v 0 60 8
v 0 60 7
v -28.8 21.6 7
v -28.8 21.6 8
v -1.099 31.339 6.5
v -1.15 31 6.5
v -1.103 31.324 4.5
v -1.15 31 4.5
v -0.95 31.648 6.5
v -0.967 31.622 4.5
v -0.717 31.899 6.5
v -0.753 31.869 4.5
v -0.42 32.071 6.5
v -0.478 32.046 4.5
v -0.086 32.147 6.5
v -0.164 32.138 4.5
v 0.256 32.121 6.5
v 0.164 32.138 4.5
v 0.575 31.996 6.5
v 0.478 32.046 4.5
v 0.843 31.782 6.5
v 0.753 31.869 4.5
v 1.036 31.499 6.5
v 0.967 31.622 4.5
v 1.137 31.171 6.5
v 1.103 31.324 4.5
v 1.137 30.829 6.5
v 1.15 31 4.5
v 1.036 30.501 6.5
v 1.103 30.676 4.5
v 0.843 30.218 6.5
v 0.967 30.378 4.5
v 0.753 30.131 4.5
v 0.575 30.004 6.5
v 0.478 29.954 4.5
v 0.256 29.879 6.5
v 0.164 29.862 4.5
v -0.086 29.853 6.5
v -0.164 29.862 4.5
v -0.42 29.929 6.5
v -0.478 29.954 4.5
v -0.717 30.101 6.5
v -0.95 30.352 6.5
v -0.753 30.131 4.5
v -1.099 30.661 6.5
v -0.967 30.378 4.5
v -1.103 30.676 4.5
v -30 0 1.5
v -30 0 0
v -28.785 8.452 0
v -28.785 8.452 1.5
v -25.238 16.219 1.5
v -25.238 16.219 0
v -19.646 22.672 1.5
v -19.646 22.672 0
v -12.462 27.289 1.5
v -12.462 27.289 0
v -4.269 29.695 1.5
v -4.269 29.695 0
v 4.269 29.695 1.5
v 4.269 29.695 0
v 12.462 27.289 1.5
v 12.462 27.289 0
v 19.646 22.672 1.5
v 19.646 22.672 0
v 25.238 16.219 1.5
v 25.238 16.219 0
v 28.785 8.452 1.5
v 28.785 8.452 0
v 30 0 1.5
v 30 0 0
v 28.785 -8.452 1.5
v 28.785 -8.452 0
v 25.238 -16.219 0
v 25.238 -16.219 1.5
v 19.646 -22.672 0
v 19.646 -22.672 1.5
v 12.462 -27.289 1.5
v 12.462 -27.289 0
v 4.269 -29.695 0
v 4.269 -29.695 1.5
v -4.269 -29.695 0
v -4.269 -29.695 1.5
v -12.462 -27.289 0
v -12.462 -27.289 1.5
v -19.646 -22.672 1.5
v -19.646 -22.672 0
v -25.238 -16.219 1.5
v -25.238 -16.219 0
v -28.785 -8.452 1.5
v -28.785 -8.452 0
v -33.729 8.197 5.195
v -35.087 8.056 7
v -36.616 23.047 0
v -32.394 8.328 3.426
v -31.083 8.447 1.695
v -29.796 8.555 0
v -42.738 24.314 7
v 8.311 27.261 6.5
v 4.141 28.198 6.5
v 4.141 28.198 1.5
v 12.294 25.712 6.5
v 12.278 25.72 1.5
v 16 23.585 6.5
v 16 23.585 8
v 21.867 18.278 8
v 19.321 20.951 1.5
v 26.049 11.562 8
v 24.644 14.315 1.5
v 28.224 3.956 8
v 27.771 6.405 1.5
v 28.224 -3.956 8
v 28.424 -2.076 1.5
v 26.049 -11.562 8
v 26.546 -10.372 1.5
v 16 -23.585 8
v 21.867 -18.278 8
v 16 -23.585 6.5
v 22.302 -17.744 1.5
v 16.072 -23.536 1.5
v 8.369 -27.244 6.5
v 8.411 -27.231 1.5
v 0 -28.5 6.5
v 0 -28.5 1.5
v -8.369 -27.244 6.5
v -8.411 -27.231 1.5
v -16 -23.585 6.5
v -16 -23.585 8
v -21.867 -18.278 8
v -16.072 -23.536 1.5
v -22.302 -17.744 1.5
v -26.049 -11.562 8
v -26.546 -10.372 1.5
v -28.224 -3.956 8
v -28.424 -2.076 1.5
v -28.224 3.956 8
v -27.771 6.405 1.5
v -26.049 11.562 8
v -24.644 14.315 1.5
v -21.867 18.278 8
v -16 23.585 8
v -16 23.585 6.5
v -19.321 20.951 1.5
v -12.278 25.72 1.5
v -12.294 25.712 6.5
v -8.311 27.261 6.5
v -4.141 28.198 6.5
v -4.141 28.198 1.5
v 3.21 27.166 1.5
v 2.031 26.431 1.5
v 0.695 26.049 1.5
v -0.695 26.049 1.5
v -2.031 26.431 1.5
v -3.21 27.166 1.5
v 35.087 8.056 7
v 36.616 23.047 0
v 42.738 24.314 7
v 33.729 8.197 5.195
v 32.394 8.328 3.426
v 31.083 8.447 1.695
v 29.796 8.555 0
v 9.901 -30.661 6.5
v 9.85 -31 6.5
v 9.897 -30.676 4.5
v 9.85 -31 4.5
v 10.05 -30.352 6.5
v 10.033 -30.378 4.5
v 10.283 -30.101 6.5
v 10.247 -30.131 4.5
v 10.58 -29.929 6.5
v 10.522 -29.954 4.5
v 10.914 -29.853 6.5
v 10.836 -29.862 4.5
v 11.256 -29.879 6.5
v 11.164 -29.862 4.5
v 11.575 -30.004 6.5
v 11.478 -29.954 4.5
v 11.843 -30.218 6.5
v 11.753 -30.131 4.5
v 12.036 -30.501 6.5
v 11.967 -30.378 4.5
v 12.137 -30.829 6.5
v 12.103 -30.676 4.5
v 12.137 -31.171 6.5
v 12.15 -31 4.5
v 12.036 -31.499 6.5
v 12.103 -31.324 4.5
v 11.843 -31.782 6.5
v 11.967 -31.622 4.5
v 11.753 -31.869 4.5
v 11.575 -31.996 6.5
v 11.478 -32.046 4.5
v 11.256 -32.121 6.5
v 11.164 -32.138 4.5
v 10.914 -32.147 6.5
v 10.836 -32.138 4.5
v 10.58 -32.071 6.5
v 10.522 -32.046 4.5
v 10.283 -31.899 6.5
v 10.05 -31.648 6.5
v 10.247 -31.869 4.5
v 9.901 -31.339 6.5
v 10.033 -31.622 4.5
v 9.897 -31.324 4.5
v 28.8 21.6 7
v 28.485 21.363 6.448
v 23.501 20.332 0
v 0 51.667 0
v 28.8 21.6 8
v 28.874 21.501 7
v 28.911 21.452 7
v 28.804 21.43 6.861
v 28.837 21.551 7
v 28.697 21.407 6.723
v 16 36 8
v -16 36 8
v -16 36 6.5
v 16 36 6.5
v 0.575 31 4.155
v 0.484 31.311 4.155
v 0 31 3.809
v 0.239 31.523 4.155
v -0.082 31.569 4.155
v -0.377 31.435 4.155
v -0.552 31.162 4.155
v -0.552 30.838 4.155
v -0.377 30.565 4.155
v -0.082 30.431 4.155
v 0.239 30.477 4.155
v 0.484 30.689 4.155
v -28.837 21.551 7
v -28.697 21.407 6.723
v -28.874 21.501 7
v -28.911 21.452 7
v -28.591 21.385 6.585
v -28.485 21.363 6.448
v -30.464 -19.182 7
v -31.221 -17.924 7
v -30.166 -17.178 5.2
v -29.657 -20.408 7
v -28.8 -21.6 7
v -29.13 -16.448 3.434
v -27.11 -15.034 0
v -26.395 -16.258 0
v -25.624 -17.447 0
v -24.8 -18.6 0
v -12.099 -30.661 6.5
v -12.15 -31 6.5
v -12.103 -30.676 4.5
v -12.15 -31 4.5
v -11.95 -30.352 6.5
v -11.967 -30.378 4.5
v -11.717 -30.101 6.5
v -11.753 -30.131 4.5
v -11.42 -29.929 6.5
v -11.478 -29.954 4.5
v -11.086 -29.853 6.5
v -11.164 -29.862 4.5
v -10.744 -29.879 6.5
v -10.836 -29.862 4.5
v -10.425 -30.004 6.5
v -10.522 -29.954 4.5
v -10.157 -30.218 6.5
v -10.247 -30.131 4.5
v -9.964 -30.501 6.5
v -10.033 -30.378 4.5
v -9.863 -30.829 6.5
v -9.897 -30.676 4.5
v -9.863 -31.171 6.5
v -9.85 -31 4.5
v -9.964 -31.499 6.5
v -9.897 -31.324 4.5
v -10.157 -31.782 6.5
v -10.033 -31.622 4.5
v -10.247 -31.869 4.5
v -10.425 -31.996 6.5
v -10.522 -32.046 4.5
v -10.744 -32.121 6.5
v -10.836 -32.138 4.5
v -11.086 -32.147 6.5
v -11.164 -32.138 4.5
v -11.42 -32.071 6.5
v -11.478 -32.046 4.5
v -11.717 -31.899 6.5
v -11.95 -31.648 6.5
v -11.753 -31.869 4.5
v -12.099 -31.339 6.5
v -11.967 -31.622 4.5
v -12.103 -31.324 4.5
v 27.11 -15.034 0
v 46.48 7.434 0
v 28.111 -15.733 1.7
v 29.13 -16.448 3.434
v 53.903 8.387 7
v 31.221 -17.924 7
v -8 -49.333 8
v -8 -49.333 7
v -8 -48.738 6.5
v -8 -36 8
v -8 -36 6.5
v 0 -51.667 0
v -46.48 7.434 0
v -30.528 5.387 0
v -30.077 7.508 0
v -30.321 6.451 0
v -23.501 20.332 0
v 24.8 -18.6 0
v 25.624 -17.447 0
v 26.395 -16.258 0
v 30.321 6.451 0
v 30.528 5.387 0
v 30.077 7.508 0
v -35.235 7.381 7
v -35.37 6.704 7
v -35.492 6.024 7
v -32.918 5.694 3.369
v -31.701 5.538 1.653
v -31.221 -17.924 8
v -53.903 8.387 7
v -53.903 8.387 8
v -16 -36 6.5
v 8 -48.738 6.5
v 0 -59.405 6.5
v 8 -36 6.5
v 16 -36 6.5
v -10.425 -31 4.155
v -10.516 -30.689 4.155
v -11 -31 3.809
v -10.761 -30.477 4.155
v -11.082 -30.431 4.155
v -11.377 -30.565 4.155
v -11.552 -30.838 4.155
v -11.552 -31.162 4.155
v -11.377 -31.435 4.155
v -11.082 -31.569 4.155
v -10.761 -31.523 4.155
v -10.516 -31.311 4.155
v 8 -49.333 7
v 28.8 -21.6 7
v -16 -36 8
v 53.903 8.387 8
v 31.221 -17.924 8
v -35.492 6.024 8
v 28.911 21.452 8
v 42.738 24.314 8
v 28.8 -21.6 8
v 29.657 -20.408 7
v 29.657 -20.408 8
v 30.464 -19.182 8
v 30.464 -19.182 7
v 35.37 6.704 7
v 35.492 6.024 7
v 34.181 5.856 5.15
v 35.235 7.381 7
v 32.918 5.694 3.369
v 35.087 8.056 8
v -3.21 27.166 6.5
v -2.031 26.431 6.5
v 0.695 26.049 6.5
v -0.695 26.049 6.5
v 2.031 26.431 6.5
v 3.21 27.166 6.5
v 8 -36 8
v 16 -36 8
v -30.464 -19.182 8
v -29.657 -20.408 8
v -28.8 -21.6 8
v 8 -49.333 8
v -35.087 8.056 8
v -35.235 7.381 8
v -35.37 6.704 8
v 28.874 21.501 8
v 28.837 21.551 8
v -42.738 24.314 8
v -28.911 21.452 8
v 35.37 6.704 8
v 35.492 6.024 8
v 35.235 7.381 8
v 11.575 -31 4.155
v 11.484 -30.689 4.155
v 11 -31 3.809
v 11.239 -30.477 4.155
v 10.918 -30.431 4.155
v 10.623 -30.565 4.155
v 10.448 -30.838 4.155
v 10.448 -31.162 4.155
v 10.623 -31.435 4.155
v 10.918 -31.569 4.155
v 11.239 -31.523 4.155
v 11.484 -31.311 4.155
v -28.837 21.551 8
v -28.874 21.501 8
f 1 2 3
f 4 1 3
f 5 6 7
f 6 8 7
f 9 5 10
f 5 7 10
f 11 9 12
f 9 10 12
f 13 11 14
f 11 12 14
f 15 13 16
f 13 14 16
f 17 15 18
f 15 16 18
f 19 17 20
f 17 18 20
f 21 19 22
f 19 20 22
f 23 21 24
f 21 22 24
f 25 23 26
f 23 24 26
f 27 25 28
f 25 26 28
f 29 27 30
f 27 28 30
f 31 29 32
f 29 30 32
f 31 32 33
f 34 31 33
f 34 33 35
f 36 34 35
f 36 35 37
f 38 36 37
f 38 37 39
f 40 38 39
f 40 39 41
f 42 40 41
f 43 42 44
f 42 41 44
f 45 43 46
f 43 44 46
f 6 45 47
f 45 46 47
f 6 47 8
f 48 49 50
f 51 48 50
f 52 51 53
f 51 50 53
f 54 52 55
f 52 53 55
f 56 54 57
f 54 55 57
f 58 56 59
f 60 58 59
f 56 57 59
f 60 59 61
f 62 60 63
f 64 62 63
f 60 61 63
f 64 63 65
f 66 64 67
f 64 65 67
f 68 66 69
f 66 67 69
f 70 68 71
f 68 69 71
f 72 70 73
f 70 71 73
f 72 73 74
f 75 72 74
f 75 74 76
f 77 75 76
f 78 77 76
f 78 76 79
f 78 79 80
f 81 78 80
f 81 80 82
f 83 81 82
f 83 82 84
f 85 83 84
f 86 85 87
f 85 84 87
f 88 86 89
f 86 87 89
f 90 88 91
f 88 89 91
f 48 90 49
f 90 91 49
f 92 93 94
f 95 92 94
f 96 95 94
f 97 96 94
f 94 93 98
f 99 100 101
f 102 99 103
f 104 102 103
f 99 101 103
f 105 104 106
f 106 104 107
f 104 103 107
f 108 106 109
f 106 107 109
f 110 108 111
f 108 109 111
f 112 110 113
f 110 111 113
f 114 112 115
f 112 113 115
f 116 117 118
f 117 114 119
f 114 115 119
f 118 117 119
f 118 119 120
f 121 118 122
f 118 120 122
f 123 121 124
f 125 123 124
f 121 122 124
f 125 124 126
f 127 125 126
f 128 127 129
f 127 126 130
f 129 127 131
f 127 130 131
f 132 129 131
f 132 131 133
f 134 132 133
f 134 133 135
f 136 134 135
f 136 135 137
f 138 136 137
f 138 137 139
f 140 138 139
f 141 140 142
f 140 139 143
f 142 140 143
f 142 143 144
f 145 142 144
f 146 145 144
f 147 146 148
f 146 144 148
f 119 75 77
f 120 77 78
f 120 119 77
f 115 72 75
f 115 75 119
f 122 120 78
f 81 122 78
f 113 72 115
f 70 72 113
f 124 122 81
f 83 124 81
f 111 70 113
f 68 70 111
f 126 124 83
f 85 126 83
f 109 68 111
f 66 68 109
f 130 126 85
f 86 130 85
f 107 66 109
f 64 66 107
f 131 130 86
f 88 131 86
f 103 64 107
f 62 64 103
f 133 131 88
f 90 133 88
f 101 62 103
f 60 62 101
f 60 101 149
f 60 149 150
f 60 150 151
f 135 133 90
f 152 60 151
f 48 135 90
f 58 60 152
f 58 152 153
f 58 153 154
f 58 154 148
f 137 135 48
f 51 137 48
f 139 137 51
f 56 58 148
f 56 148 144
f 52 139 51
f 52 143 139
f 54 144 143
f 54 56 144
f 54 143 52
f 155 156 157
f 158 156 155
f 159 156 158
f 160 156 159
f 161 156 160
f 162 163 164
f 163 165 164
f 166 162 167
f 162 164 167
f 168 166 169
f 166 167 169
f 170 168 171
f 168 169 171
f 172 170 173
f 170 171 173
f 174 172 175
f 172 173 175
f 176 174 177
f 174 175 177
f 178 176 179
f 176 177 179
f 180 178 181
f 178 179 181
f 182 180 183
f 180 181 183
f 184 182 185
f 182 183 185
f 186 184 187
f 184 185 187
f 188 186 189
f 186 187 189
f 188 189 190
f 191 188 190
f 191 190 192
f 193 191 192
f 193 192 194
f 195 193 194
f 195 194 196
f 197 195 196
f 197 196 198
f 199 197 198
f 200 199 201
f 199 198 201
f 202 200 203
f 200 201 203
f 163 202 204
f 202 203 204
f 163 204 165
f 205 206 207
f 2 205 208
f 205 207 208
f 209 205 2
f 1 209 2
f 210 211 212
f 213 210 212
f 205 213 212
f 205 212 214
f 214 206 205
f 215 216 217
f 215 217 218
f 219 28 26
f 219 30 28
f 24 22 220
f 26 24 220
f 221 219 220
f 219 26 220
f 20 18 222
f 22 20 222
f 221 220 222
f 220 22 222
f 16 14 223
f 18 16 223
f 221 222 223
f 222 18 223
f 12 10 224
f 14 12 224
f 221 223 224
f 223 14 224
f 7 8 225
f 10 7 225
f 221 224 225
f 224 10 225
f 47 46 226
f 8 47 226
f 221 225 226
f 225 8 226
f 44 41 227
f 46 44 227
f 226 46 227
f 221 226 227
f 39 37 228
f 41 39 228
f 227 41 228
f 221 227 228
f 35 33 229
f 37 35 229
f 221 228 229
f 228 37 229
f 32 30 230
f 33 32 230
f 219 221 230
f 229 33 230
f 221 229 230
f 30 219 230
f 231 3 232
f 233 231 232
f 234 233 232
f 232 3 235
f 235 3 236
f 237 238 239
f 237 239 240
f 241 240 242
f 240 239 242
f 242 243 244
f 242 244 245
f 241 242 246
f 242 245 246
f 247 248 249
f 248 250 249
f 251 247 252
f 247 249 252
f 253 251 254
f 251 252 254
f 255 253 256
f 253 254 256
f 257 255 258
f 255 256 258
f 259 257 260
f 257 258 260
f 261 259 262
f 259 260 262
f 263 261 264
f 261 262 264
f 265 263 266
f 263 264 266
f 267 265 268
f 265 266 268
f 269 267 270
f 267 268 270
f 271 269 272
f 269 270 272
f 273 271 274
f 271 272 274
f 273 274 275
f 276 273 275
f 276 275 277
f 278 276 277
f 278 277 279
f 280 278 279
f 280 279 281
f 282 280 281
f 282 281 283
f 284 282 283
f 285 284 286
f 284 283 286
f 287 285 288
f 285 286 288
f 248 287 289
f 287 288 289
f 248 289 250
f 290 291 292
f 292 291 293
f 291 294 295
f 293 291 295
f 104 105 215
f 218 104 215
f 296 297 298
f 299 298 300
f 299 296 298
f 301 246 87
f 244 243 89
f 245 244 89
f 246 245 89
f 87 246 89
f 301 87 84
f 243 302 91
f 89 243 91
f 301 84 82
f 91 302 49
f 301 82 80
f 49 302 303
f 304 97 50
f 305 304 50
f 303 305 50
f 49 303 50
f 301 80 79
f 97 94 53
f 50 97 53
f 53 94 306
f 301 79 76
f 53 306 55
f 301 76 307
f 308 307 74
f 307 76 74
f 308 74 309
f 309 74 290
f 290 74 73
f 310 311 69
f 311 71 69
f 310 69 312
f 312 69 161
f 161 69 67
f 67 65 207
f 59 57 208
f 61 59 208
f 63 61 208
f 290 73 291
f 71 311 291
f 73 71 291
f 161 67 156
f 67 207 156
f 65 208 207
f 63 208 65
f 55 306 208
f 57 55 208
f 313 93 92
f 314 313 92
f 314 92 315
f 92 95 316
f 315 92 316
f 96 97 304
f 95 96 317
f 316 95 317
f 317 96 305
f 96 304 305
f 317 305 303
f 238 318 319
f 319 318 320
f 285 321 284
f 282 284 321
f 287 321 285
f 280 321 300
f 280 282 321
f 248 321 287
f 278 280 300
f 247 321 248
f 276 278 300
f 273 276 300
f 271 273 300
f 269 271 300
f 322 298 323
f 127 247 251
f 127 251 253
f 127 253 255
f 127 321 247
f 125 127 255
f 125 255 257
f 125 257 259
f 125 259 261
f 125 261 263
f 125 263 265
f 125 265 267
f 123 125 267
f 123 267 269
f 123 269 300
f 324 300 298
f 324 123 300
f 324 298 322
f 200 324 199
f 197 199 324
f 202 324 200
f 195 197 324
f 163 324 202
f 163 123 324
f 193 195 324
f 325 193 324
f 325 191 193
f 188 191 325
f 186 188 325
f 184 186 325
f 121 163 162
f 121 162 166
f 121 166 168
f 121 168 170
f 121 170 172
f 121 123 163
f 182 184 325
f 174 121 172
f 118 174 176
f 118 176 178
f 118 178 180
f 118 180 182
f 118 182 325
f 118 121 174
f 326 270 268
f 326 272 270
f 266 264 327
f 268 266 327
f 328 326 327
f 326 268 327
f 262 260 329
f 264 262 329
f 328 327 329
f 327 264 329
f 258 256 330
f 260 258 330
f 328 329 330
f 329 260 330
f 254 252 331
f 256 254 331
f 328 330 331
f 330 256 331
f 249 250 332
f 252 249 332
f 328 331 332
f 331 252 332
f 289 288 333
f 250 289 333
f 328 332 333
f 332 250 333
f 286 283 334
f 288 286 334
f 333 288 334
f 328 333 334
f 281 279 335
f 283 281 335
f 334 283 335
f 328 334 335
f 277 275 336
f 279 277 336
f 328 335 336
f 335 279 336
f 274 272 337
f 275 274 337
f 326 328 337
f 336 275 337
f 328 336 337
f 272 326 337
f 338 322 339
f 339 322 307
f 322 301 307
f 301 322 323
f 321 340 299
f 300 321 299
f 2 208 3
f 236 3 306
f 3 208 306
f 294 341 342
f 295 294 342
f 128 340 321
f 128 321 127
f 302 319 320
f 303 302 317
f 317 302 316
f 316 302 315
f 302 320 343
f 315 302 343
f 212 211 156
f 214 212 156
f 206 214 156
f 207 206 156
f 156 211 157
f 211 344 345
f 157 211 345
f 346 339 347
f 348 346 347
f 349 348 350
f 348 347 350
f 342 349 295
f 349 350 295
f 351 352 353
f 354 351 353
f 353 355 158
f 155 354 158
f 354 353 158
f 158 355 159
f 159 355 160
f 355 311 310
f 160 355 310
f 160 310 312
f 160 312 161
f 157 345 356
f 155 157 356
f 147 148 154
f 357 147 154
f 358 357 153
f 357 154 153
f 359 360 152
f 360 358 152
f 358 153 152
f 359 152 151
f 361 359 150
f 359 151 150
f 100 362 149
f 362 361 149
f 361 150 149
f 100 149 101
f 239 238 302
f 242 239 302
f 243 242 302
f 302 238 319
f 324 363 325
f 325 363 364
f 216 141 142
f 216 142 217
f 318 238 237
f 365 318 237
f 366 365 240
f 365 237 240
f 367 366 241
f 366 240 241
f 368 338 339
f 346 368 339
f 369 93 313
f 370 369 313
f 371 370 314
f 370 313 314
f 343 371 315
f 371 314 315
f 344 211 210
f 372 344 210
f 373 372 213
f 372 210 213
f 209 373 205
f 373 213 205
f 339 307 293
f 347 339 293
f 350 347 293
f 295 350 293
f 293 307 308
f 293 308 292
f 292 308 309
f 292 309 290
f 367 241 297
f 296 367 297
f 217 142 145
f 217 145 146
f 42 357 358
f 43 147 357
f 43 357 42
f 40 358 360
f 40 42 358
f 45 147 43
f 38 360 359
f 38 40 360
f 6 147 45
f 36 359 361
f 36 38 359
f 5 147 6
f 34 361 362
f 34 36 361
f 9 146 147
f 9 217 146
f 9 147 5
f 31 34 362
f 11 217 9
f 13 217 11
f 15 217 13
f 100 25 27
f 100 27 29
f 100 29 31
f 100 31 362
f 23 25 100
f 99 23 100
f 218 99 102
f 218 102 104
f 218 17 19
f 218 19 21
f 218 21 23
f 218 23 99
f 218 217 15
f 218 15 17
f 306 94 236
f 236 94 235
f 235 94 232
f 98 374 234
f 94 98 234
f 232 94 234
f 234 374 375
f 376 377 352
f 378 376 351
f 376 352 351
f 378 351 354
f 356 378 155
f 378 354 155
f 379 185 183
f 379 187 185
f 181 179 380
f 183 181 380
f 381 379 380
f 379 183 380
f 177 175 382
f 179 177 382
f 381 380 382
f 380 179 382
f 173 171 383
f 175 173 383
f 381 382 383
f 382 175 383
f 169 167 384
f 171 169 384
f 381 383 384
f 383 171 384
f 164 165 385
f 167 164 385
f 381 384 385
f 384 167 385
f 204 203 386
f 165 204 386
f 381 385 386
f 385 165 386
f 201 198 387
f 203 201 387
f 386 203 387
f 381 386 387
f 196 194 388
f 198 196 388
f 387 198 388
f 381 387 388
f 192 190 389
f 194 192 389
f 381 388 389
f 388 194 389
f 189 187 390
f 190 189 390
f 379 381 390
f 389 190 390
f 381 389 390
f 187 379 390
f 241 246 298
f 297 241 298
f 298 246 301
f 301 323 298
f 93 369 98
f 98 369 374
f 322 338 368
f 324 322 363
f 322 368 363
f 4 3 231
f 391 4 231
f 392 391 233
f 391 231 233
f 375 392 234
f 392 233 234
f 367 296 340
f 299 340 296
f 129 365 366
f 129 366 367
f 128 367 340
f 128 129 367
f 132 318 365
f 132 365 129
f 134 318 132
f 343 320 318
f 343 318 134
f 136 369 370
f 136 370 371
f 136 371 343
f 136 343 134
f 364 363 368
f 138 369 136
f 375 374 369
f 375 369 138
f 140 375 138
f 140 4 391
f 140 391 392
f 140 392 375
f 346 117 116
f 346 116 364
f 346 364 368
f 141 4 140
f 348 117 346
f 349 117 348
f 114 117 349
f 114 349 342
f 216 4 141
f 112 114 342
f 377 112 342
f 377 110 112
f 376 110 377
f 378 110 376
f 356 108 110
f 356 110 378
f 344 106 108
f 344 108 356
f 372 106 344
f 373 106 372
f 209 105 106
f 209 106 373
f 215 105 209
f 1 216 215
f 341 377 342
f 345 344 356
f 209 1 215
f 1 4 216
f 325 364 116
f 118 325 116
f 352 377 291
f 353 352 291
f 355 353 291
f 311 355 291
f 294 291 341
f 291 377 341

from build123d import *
from OCP.BRepFilletAPI import BRepFilletAPI_MakeChamfer

# Parameters (mm, degrees)
EXTRUDE_1_DEPTH         = 8
CHAMFER_12_SIZE         = 7
CHAMFER_12_SIZE2        = 5
HOLE_WIZARD_M2_22_D     = 2.3
HOLE_WIZARD_M2_22_DEPTH = 3.5
HOLE_WIZARD_M2_22_TIP   = 0.690989712
SKETCH_11_R             = 30
CUT_EXTRUDE_1_DEPTH     = 1.5
EXTRUDE_5_DEPTH         = 8
EXTRUDE_5_2_DEPTH       = 8
EXTRUDE_5_3_DEPTH       = 8
EXTRUDE_5_4_DEPTH       = 8
CHAMFER_13_SIZE         = 5
CHAMFER_13_SIZE2        = 7
CHAMFER_14_SIZE         = 5
CHAMFER_14_SIZE2        = 7
CHAMFER_15_SIZE         = 7
CHAMFER_15_SIZE2        = 5
CHAMFER_16_SIZE         = 5
CHAMFER_16_SIZE2        = 7
SKETCH_23_W             = 32
SKETCH_23_H             = 72
CUT_EXTRUDE_7_DEPTH     = 1.5
SKETCH_13_W             = 16
SKETCH_13_H             = 24
CUT_EXTRUDE_2_DEPTH     = 1.5


with BuildPart() as part:
    # Эскиз1 → Бобышка-Вытянуть1 (new body)
    with BuildSketch(Plane.XY):
        with BuildLine():
            Line((28.8, 21.6), (0, 60))
            Line((0, 60), (-28.8, 21.6))
            ThreePointArc((-28.8, 21.6), (-36, 0), (-28.8, -21.6))
            Line((-28.8, -21.6), (0, -60))
            Line((0, -60), (28.8, -21.6))
            ThreePointArc((28.8, -21.6), (36, 0), (28.8, 21.6))
        make_face()
        with BuildLine():
            ThreePointArc((4.1408267, 28.197580645), (0, -28.5), (-4.1408267, 28.197580645))
            ThreePointArc((-4.1408267, 28.197580645), (0, 26), (4.1408267, 28.197580645))
        make_face(mode=Mode.SUBTRACT)
    extrude(amount=EXTRUDE_1_DEPTH)

    # Фаска12: one chamfer whose edges measure the first distance from different faces: ONE call of the kernel's chamfer builder (chamfer() names one face for all edges)
    chamfer_12_edges_1 = [part.edges().sort_by_distance(p)[0] for p in [
        (14.4, 40.8, 0),
    ]]
    chamfer_12_side_1 = [part.faces().sort_by_distance(p)[0] for p in [
        (14.4, 40.8, 4),
    ]]
    chamfer_12_edges_2 = [part.edges().sort_by_distance(p)[0] for p in [
        (36, 0, 0),
    ]]
    chamfer_12_side_2 = [part.faces().sort_by_distance(p)[0] for p in [
        (36, 0, 4),
    ]]
    chamfer_12_edges_3 = [part.edges().sort_by_distance(p)[0] for p in [
        (14.4, -40.8, 0),
    ]]
    chamfer_12_side_3 = [part.faces().sort_by_distance(p)[0] for p in [
        (14.4, -40.8, 4),
    ]]
    chamfer_12_edges_4 = [part.edges().sort_by_distance(p)[0] for p in [
        (-14.4, -40.8, 0),
    ]]
    chamfer_12_side_4 = [part.faces().sort_by_distance(p)[0] for p in [
        (-14.4, -40.8, 4),
    ]]
    chamfer_12_edges_5 = [part.edges().sort_by_distance(p)[0] for p in [
        (-36, 0, 0),
    ]]
    chamfer_12_side_5 = [part.faces().sort_by_distance(p)[0] for p in [
        (-36, 0, 4),
    ]]
    chamfer_12_edges_6 = [part.edges().sort_by_distance(p)[0] for p in [
        (-14.4, 40.8, 0),
    ]]
    chamfer_12_side_6 = [part.faces().sort_by_distance(p)[0] for p in [
        (-14.4, 40.8, 4),
    ]]
    chamfer_12 = BRepFilletAPI_MakeChamfer(part.part.solid().wrapped)
    for e in chamfer_12_edges_1:
        chamfer_12.Add(CHAMFER_12_SIZE, CHAMFER_12_SIZE2, e.wrapped, chamfer_12_side_1[0].wrapped)  # the first distance lies on this face
    for e in chamfer_12_edges_2:
        chamfer_12.Add(CHAMFER_12_SIZE, CHAMFER_12_SIZE2, e.wrapped, chamfer_12_side_2[0].wrapped)  # the first distance lies on this face
    for e in chamfer_12_edges_3:
        chamfer_12.Add(CHAMFER_12_SIZE, CHAMFER_12_SIZE2, e.wrapped, chamfer_12_side_3[0].wrapped)  # the first distance lies on this face
    for e in chamfer_12_edges_4:
        chamfer_12.Add(CHAMFER_12_SIZE, CHAMFER_12_SIZE2, e.wrapped, chamfer_12_side_4[0].wrapped)  # the first distance lies on this face
    for e in chamfer_12_edges_5:
        chamfer_12.Add(CHAMFER_12_SIZE, CHAMFER_12_SIZE2, e.wrapped, chamfer_12_side_5[0].wrapped)  # the first distance lies on this face
    for e in chamfer_12_edges_6:
        chamfer_12.Add(CHAMFER_12_SIZE, CHAMFER_12_SIZE2, e.wrapped, chamfer_12_side_6[0].wrapped)  # the first distance lies on this face
    add(Compound.cast(chamfer_12.Shape()), mode=Mode.REPLACE)

    # Hole Wizard M2.22
    with Locations(Plane.XY.offset(8)):
        with Locations((0, 31), (-11, -31), (11, -31)):
            Hole(HOLE_WIZARD_M2_22_D / 2, depth=HOLE_WIZARD_M2_22_DEPTH)
            with Locations((0, 0, -(HOLE_WIZARD_M2_22_DEPTH + HOLE_WIZARD_M2_22_TIP / 2))):  # 118° drill point
                Cone(0, HOLE_WIZARD_M2_22_D / 2, HOLE_WIZARD_M2_22_TIP, mode=Mode.SUBTRACT)

    # Эскиз11 → Вырез-Вытянуть1 (cut)
    with BuildSketch(Plane(origin=(0, 0, 0), x_dir=(-1, 0, 0), z_dir=(0, 0, -1))):
        Circle(SKETCH_11_R)
    extrude(amount=-CUT_EXTRUDE_1_DEPTH, mode=Mode.SUBTRACT)


with BuildPart() as body_2:
    # Эскиз17 → Бобышка-Вытянуть5 (new body)
    with BuildSketch(Plane(origin=(0, 0, 8), x_dir=(-1, 0, 0), z_dir=(0, 0, -1))):
        with BuildLine():
            Line((25.238858928, -18), (28.902564257, -20.612903226))
            Line((28.902564257, -20.612903226), (53.902564257, 8.387096774))
            Line((53.902564257, 8.387096774), (30.528334189, 5.387096774))
            ThreePointArc((30.528334189, 5.387096774), (30.236303195, -6.838564841), (25.238858928, -18))
        make_face()
    extrude(amount=EXTRUDE_5_DEPTH)

    # Фаска13
    chamfer_13_edges = [body_2.edges().sort_by_distance(p)[0] for p in [
        (-41.402564257, -6.112903226, 0),
    ]]
    chamfer_13_side = [body_2.faces().sort_by_distance(p)[0] for p in [
        (-37.369612162, -3.153009871, 0),
    ]]
    chamfer(chamfer_13_edges, length=CHAMFER_13_SIZE, length2=CHAMFER_13_SIZE2, reference=chamfer_13_side[0])


with BuildPart() as body_3:
    # Эскиз17 → Extrude 5 2 (new body)
    with BuildSketch(Plane(origin=(0, 0, 8), x_dir=(-1, 0, 0), z_dir=(0, 0, -1))):
        with BuildLine():
            Line((-28.902564257, -20.612903226), (-25.238858928, -18))
            ThreePointArc((-25.238858928, -18), (-30.236303195, -6.838564841), (-30.528334189, 5.387096774))
            Line((-30.528334189, 5.387096774), (-53.902564257, 8.387096774))
            Line((-53.902564257, 8.387096774), (-28.902564257, -20.612903226))
        make_face()
    extrude(amount=EXTRUDE_5_2_DEPTH)

    # Фаска14
    chamfer_14_edges = [body_3.edges().sort_by_distance(p)[0] for p in [
        (41.402564257, -6.112903226, 0),
    ]]
    chamfer_14_side = [body_3.faces().sort_by_distance(p)[0] for p in [
        (37.369612162, -3.153009871, 0),
    ]]
    chamfer(chamfer_14_edges, length=CHAMFER_14_SIZE, length2=CHAMFER_14_SIZE2, reference=chamfer_14_side[0])


with BuildPart() as body_4:
    # Эскиз17 → Extrude 5 3 (new body)
    with BuildSketch(Plane(origin=(0, 0, 8), x_dir=(-1, 0, 0), z_dir=(0, 0, -1))):
        with BuildLine():
            ThreePointArc((23.416468646, 20.314255983), (27.763165047, 13.791543298), (30.334880827, 6.387096774))
            Line((30.334880827, 6.387096774), (34.73833127, 7.314255983))
            Line((34.73833127, 7.314255983), (42.73833127, 24.314255983))
            Line((42.73833127, 24.314255983), (23.416468646, 20.314255983))
        make_face()
    extrude(amount=EXTRUDE_5_3_DEPTH)

    # Фаска16
    chamfer_16_edges = [body_4.edges().sort_by_distance(p)[0] for p in [
        (-38.73833127, 15.814255983, 0),
    ]]
    chamfer_16_side = [body_4.faces().sort_by_distance(p)[0] for p in [
        (-33.199864657, 16.363314329, 0),
    ]]
    chamfer(chamfer_16_edges, length=CHAMFER_16_SIZE, length2=CHAMFER_16_SIZE2, reference=chamfer_16_side[0])


with BuildPart() as body_5:
    # Эскиз17 → Extrude 5 4 (new body)
    with BuildSketch(Plane(origin=(0, 0, 8), x_dir=(-1, 0, 0), z_dir=(0, 0, -1))):
        with BuildLine():
            Line((-34.73833127, 7.314255983), (-30.334880827, 6.387096774))
            ThreePointArc((-30.334880827, 6.387096774), (-27.763165047, 13.791543298), (-23.416468646, 20.314255983))
            Line((-23.416468646, 20.314255983), (-42.73833127, 24.314255983))
            Line((-42.73833127, 24.314255983), (-34.73833127, 7.314255983))
        make_face()
    extrude(amount=EXTRUDE_5_4_DEPTH)

    # Фаска15
    chamfer_15_edges = [body_5.edges().sort_by_distance(p)[0] for p in [
        (38.73833127, 15.814255983, 0),
    ]]
    chamfer_15_side = [body_5.faces().sort_by_distance(p)[0] for p in [
        (38.73833127, 15.814255983, 4),
    ]]
    chamfer(chamfer_15_edges, length=CHAMFER_15_SIZE, length2=CHAMFER_15_SIZE2, reference=chamfer_15_side[0])


with BuildPart() as body_2_1:
    add(body_2.part)

    # Combine 2: union body 3, body 5, body 4, part
    add(body_3.part)
    add(body_5.part)
    add(body_4.part)
    add(part.part)

    # Эскиз23 → Вырез-Вытянуть7 (cut)
    with BuildSketch(Plane.XY.offset(8)):
        Rectangle(SKETCH_23_W, SKETCH_23_H)
    extrude(amount=-CUT_EXTRUDE_7_DEPTH, mode=Mode.SUBTRACT)

    # Эскиз13 → Вырез-Вытянуть2 (cut)
    with BuildSketch(Plane.XY.offset(8)):
        with Locations((0, -48)):
            Rectangle(SKETCH_13_W, SKETCH_13_H)
    extrude(amount=-CUT_EXTRUDE_2_DEPTH, mode=Mode.SUBTRACT)


solid = body_2_1.part
